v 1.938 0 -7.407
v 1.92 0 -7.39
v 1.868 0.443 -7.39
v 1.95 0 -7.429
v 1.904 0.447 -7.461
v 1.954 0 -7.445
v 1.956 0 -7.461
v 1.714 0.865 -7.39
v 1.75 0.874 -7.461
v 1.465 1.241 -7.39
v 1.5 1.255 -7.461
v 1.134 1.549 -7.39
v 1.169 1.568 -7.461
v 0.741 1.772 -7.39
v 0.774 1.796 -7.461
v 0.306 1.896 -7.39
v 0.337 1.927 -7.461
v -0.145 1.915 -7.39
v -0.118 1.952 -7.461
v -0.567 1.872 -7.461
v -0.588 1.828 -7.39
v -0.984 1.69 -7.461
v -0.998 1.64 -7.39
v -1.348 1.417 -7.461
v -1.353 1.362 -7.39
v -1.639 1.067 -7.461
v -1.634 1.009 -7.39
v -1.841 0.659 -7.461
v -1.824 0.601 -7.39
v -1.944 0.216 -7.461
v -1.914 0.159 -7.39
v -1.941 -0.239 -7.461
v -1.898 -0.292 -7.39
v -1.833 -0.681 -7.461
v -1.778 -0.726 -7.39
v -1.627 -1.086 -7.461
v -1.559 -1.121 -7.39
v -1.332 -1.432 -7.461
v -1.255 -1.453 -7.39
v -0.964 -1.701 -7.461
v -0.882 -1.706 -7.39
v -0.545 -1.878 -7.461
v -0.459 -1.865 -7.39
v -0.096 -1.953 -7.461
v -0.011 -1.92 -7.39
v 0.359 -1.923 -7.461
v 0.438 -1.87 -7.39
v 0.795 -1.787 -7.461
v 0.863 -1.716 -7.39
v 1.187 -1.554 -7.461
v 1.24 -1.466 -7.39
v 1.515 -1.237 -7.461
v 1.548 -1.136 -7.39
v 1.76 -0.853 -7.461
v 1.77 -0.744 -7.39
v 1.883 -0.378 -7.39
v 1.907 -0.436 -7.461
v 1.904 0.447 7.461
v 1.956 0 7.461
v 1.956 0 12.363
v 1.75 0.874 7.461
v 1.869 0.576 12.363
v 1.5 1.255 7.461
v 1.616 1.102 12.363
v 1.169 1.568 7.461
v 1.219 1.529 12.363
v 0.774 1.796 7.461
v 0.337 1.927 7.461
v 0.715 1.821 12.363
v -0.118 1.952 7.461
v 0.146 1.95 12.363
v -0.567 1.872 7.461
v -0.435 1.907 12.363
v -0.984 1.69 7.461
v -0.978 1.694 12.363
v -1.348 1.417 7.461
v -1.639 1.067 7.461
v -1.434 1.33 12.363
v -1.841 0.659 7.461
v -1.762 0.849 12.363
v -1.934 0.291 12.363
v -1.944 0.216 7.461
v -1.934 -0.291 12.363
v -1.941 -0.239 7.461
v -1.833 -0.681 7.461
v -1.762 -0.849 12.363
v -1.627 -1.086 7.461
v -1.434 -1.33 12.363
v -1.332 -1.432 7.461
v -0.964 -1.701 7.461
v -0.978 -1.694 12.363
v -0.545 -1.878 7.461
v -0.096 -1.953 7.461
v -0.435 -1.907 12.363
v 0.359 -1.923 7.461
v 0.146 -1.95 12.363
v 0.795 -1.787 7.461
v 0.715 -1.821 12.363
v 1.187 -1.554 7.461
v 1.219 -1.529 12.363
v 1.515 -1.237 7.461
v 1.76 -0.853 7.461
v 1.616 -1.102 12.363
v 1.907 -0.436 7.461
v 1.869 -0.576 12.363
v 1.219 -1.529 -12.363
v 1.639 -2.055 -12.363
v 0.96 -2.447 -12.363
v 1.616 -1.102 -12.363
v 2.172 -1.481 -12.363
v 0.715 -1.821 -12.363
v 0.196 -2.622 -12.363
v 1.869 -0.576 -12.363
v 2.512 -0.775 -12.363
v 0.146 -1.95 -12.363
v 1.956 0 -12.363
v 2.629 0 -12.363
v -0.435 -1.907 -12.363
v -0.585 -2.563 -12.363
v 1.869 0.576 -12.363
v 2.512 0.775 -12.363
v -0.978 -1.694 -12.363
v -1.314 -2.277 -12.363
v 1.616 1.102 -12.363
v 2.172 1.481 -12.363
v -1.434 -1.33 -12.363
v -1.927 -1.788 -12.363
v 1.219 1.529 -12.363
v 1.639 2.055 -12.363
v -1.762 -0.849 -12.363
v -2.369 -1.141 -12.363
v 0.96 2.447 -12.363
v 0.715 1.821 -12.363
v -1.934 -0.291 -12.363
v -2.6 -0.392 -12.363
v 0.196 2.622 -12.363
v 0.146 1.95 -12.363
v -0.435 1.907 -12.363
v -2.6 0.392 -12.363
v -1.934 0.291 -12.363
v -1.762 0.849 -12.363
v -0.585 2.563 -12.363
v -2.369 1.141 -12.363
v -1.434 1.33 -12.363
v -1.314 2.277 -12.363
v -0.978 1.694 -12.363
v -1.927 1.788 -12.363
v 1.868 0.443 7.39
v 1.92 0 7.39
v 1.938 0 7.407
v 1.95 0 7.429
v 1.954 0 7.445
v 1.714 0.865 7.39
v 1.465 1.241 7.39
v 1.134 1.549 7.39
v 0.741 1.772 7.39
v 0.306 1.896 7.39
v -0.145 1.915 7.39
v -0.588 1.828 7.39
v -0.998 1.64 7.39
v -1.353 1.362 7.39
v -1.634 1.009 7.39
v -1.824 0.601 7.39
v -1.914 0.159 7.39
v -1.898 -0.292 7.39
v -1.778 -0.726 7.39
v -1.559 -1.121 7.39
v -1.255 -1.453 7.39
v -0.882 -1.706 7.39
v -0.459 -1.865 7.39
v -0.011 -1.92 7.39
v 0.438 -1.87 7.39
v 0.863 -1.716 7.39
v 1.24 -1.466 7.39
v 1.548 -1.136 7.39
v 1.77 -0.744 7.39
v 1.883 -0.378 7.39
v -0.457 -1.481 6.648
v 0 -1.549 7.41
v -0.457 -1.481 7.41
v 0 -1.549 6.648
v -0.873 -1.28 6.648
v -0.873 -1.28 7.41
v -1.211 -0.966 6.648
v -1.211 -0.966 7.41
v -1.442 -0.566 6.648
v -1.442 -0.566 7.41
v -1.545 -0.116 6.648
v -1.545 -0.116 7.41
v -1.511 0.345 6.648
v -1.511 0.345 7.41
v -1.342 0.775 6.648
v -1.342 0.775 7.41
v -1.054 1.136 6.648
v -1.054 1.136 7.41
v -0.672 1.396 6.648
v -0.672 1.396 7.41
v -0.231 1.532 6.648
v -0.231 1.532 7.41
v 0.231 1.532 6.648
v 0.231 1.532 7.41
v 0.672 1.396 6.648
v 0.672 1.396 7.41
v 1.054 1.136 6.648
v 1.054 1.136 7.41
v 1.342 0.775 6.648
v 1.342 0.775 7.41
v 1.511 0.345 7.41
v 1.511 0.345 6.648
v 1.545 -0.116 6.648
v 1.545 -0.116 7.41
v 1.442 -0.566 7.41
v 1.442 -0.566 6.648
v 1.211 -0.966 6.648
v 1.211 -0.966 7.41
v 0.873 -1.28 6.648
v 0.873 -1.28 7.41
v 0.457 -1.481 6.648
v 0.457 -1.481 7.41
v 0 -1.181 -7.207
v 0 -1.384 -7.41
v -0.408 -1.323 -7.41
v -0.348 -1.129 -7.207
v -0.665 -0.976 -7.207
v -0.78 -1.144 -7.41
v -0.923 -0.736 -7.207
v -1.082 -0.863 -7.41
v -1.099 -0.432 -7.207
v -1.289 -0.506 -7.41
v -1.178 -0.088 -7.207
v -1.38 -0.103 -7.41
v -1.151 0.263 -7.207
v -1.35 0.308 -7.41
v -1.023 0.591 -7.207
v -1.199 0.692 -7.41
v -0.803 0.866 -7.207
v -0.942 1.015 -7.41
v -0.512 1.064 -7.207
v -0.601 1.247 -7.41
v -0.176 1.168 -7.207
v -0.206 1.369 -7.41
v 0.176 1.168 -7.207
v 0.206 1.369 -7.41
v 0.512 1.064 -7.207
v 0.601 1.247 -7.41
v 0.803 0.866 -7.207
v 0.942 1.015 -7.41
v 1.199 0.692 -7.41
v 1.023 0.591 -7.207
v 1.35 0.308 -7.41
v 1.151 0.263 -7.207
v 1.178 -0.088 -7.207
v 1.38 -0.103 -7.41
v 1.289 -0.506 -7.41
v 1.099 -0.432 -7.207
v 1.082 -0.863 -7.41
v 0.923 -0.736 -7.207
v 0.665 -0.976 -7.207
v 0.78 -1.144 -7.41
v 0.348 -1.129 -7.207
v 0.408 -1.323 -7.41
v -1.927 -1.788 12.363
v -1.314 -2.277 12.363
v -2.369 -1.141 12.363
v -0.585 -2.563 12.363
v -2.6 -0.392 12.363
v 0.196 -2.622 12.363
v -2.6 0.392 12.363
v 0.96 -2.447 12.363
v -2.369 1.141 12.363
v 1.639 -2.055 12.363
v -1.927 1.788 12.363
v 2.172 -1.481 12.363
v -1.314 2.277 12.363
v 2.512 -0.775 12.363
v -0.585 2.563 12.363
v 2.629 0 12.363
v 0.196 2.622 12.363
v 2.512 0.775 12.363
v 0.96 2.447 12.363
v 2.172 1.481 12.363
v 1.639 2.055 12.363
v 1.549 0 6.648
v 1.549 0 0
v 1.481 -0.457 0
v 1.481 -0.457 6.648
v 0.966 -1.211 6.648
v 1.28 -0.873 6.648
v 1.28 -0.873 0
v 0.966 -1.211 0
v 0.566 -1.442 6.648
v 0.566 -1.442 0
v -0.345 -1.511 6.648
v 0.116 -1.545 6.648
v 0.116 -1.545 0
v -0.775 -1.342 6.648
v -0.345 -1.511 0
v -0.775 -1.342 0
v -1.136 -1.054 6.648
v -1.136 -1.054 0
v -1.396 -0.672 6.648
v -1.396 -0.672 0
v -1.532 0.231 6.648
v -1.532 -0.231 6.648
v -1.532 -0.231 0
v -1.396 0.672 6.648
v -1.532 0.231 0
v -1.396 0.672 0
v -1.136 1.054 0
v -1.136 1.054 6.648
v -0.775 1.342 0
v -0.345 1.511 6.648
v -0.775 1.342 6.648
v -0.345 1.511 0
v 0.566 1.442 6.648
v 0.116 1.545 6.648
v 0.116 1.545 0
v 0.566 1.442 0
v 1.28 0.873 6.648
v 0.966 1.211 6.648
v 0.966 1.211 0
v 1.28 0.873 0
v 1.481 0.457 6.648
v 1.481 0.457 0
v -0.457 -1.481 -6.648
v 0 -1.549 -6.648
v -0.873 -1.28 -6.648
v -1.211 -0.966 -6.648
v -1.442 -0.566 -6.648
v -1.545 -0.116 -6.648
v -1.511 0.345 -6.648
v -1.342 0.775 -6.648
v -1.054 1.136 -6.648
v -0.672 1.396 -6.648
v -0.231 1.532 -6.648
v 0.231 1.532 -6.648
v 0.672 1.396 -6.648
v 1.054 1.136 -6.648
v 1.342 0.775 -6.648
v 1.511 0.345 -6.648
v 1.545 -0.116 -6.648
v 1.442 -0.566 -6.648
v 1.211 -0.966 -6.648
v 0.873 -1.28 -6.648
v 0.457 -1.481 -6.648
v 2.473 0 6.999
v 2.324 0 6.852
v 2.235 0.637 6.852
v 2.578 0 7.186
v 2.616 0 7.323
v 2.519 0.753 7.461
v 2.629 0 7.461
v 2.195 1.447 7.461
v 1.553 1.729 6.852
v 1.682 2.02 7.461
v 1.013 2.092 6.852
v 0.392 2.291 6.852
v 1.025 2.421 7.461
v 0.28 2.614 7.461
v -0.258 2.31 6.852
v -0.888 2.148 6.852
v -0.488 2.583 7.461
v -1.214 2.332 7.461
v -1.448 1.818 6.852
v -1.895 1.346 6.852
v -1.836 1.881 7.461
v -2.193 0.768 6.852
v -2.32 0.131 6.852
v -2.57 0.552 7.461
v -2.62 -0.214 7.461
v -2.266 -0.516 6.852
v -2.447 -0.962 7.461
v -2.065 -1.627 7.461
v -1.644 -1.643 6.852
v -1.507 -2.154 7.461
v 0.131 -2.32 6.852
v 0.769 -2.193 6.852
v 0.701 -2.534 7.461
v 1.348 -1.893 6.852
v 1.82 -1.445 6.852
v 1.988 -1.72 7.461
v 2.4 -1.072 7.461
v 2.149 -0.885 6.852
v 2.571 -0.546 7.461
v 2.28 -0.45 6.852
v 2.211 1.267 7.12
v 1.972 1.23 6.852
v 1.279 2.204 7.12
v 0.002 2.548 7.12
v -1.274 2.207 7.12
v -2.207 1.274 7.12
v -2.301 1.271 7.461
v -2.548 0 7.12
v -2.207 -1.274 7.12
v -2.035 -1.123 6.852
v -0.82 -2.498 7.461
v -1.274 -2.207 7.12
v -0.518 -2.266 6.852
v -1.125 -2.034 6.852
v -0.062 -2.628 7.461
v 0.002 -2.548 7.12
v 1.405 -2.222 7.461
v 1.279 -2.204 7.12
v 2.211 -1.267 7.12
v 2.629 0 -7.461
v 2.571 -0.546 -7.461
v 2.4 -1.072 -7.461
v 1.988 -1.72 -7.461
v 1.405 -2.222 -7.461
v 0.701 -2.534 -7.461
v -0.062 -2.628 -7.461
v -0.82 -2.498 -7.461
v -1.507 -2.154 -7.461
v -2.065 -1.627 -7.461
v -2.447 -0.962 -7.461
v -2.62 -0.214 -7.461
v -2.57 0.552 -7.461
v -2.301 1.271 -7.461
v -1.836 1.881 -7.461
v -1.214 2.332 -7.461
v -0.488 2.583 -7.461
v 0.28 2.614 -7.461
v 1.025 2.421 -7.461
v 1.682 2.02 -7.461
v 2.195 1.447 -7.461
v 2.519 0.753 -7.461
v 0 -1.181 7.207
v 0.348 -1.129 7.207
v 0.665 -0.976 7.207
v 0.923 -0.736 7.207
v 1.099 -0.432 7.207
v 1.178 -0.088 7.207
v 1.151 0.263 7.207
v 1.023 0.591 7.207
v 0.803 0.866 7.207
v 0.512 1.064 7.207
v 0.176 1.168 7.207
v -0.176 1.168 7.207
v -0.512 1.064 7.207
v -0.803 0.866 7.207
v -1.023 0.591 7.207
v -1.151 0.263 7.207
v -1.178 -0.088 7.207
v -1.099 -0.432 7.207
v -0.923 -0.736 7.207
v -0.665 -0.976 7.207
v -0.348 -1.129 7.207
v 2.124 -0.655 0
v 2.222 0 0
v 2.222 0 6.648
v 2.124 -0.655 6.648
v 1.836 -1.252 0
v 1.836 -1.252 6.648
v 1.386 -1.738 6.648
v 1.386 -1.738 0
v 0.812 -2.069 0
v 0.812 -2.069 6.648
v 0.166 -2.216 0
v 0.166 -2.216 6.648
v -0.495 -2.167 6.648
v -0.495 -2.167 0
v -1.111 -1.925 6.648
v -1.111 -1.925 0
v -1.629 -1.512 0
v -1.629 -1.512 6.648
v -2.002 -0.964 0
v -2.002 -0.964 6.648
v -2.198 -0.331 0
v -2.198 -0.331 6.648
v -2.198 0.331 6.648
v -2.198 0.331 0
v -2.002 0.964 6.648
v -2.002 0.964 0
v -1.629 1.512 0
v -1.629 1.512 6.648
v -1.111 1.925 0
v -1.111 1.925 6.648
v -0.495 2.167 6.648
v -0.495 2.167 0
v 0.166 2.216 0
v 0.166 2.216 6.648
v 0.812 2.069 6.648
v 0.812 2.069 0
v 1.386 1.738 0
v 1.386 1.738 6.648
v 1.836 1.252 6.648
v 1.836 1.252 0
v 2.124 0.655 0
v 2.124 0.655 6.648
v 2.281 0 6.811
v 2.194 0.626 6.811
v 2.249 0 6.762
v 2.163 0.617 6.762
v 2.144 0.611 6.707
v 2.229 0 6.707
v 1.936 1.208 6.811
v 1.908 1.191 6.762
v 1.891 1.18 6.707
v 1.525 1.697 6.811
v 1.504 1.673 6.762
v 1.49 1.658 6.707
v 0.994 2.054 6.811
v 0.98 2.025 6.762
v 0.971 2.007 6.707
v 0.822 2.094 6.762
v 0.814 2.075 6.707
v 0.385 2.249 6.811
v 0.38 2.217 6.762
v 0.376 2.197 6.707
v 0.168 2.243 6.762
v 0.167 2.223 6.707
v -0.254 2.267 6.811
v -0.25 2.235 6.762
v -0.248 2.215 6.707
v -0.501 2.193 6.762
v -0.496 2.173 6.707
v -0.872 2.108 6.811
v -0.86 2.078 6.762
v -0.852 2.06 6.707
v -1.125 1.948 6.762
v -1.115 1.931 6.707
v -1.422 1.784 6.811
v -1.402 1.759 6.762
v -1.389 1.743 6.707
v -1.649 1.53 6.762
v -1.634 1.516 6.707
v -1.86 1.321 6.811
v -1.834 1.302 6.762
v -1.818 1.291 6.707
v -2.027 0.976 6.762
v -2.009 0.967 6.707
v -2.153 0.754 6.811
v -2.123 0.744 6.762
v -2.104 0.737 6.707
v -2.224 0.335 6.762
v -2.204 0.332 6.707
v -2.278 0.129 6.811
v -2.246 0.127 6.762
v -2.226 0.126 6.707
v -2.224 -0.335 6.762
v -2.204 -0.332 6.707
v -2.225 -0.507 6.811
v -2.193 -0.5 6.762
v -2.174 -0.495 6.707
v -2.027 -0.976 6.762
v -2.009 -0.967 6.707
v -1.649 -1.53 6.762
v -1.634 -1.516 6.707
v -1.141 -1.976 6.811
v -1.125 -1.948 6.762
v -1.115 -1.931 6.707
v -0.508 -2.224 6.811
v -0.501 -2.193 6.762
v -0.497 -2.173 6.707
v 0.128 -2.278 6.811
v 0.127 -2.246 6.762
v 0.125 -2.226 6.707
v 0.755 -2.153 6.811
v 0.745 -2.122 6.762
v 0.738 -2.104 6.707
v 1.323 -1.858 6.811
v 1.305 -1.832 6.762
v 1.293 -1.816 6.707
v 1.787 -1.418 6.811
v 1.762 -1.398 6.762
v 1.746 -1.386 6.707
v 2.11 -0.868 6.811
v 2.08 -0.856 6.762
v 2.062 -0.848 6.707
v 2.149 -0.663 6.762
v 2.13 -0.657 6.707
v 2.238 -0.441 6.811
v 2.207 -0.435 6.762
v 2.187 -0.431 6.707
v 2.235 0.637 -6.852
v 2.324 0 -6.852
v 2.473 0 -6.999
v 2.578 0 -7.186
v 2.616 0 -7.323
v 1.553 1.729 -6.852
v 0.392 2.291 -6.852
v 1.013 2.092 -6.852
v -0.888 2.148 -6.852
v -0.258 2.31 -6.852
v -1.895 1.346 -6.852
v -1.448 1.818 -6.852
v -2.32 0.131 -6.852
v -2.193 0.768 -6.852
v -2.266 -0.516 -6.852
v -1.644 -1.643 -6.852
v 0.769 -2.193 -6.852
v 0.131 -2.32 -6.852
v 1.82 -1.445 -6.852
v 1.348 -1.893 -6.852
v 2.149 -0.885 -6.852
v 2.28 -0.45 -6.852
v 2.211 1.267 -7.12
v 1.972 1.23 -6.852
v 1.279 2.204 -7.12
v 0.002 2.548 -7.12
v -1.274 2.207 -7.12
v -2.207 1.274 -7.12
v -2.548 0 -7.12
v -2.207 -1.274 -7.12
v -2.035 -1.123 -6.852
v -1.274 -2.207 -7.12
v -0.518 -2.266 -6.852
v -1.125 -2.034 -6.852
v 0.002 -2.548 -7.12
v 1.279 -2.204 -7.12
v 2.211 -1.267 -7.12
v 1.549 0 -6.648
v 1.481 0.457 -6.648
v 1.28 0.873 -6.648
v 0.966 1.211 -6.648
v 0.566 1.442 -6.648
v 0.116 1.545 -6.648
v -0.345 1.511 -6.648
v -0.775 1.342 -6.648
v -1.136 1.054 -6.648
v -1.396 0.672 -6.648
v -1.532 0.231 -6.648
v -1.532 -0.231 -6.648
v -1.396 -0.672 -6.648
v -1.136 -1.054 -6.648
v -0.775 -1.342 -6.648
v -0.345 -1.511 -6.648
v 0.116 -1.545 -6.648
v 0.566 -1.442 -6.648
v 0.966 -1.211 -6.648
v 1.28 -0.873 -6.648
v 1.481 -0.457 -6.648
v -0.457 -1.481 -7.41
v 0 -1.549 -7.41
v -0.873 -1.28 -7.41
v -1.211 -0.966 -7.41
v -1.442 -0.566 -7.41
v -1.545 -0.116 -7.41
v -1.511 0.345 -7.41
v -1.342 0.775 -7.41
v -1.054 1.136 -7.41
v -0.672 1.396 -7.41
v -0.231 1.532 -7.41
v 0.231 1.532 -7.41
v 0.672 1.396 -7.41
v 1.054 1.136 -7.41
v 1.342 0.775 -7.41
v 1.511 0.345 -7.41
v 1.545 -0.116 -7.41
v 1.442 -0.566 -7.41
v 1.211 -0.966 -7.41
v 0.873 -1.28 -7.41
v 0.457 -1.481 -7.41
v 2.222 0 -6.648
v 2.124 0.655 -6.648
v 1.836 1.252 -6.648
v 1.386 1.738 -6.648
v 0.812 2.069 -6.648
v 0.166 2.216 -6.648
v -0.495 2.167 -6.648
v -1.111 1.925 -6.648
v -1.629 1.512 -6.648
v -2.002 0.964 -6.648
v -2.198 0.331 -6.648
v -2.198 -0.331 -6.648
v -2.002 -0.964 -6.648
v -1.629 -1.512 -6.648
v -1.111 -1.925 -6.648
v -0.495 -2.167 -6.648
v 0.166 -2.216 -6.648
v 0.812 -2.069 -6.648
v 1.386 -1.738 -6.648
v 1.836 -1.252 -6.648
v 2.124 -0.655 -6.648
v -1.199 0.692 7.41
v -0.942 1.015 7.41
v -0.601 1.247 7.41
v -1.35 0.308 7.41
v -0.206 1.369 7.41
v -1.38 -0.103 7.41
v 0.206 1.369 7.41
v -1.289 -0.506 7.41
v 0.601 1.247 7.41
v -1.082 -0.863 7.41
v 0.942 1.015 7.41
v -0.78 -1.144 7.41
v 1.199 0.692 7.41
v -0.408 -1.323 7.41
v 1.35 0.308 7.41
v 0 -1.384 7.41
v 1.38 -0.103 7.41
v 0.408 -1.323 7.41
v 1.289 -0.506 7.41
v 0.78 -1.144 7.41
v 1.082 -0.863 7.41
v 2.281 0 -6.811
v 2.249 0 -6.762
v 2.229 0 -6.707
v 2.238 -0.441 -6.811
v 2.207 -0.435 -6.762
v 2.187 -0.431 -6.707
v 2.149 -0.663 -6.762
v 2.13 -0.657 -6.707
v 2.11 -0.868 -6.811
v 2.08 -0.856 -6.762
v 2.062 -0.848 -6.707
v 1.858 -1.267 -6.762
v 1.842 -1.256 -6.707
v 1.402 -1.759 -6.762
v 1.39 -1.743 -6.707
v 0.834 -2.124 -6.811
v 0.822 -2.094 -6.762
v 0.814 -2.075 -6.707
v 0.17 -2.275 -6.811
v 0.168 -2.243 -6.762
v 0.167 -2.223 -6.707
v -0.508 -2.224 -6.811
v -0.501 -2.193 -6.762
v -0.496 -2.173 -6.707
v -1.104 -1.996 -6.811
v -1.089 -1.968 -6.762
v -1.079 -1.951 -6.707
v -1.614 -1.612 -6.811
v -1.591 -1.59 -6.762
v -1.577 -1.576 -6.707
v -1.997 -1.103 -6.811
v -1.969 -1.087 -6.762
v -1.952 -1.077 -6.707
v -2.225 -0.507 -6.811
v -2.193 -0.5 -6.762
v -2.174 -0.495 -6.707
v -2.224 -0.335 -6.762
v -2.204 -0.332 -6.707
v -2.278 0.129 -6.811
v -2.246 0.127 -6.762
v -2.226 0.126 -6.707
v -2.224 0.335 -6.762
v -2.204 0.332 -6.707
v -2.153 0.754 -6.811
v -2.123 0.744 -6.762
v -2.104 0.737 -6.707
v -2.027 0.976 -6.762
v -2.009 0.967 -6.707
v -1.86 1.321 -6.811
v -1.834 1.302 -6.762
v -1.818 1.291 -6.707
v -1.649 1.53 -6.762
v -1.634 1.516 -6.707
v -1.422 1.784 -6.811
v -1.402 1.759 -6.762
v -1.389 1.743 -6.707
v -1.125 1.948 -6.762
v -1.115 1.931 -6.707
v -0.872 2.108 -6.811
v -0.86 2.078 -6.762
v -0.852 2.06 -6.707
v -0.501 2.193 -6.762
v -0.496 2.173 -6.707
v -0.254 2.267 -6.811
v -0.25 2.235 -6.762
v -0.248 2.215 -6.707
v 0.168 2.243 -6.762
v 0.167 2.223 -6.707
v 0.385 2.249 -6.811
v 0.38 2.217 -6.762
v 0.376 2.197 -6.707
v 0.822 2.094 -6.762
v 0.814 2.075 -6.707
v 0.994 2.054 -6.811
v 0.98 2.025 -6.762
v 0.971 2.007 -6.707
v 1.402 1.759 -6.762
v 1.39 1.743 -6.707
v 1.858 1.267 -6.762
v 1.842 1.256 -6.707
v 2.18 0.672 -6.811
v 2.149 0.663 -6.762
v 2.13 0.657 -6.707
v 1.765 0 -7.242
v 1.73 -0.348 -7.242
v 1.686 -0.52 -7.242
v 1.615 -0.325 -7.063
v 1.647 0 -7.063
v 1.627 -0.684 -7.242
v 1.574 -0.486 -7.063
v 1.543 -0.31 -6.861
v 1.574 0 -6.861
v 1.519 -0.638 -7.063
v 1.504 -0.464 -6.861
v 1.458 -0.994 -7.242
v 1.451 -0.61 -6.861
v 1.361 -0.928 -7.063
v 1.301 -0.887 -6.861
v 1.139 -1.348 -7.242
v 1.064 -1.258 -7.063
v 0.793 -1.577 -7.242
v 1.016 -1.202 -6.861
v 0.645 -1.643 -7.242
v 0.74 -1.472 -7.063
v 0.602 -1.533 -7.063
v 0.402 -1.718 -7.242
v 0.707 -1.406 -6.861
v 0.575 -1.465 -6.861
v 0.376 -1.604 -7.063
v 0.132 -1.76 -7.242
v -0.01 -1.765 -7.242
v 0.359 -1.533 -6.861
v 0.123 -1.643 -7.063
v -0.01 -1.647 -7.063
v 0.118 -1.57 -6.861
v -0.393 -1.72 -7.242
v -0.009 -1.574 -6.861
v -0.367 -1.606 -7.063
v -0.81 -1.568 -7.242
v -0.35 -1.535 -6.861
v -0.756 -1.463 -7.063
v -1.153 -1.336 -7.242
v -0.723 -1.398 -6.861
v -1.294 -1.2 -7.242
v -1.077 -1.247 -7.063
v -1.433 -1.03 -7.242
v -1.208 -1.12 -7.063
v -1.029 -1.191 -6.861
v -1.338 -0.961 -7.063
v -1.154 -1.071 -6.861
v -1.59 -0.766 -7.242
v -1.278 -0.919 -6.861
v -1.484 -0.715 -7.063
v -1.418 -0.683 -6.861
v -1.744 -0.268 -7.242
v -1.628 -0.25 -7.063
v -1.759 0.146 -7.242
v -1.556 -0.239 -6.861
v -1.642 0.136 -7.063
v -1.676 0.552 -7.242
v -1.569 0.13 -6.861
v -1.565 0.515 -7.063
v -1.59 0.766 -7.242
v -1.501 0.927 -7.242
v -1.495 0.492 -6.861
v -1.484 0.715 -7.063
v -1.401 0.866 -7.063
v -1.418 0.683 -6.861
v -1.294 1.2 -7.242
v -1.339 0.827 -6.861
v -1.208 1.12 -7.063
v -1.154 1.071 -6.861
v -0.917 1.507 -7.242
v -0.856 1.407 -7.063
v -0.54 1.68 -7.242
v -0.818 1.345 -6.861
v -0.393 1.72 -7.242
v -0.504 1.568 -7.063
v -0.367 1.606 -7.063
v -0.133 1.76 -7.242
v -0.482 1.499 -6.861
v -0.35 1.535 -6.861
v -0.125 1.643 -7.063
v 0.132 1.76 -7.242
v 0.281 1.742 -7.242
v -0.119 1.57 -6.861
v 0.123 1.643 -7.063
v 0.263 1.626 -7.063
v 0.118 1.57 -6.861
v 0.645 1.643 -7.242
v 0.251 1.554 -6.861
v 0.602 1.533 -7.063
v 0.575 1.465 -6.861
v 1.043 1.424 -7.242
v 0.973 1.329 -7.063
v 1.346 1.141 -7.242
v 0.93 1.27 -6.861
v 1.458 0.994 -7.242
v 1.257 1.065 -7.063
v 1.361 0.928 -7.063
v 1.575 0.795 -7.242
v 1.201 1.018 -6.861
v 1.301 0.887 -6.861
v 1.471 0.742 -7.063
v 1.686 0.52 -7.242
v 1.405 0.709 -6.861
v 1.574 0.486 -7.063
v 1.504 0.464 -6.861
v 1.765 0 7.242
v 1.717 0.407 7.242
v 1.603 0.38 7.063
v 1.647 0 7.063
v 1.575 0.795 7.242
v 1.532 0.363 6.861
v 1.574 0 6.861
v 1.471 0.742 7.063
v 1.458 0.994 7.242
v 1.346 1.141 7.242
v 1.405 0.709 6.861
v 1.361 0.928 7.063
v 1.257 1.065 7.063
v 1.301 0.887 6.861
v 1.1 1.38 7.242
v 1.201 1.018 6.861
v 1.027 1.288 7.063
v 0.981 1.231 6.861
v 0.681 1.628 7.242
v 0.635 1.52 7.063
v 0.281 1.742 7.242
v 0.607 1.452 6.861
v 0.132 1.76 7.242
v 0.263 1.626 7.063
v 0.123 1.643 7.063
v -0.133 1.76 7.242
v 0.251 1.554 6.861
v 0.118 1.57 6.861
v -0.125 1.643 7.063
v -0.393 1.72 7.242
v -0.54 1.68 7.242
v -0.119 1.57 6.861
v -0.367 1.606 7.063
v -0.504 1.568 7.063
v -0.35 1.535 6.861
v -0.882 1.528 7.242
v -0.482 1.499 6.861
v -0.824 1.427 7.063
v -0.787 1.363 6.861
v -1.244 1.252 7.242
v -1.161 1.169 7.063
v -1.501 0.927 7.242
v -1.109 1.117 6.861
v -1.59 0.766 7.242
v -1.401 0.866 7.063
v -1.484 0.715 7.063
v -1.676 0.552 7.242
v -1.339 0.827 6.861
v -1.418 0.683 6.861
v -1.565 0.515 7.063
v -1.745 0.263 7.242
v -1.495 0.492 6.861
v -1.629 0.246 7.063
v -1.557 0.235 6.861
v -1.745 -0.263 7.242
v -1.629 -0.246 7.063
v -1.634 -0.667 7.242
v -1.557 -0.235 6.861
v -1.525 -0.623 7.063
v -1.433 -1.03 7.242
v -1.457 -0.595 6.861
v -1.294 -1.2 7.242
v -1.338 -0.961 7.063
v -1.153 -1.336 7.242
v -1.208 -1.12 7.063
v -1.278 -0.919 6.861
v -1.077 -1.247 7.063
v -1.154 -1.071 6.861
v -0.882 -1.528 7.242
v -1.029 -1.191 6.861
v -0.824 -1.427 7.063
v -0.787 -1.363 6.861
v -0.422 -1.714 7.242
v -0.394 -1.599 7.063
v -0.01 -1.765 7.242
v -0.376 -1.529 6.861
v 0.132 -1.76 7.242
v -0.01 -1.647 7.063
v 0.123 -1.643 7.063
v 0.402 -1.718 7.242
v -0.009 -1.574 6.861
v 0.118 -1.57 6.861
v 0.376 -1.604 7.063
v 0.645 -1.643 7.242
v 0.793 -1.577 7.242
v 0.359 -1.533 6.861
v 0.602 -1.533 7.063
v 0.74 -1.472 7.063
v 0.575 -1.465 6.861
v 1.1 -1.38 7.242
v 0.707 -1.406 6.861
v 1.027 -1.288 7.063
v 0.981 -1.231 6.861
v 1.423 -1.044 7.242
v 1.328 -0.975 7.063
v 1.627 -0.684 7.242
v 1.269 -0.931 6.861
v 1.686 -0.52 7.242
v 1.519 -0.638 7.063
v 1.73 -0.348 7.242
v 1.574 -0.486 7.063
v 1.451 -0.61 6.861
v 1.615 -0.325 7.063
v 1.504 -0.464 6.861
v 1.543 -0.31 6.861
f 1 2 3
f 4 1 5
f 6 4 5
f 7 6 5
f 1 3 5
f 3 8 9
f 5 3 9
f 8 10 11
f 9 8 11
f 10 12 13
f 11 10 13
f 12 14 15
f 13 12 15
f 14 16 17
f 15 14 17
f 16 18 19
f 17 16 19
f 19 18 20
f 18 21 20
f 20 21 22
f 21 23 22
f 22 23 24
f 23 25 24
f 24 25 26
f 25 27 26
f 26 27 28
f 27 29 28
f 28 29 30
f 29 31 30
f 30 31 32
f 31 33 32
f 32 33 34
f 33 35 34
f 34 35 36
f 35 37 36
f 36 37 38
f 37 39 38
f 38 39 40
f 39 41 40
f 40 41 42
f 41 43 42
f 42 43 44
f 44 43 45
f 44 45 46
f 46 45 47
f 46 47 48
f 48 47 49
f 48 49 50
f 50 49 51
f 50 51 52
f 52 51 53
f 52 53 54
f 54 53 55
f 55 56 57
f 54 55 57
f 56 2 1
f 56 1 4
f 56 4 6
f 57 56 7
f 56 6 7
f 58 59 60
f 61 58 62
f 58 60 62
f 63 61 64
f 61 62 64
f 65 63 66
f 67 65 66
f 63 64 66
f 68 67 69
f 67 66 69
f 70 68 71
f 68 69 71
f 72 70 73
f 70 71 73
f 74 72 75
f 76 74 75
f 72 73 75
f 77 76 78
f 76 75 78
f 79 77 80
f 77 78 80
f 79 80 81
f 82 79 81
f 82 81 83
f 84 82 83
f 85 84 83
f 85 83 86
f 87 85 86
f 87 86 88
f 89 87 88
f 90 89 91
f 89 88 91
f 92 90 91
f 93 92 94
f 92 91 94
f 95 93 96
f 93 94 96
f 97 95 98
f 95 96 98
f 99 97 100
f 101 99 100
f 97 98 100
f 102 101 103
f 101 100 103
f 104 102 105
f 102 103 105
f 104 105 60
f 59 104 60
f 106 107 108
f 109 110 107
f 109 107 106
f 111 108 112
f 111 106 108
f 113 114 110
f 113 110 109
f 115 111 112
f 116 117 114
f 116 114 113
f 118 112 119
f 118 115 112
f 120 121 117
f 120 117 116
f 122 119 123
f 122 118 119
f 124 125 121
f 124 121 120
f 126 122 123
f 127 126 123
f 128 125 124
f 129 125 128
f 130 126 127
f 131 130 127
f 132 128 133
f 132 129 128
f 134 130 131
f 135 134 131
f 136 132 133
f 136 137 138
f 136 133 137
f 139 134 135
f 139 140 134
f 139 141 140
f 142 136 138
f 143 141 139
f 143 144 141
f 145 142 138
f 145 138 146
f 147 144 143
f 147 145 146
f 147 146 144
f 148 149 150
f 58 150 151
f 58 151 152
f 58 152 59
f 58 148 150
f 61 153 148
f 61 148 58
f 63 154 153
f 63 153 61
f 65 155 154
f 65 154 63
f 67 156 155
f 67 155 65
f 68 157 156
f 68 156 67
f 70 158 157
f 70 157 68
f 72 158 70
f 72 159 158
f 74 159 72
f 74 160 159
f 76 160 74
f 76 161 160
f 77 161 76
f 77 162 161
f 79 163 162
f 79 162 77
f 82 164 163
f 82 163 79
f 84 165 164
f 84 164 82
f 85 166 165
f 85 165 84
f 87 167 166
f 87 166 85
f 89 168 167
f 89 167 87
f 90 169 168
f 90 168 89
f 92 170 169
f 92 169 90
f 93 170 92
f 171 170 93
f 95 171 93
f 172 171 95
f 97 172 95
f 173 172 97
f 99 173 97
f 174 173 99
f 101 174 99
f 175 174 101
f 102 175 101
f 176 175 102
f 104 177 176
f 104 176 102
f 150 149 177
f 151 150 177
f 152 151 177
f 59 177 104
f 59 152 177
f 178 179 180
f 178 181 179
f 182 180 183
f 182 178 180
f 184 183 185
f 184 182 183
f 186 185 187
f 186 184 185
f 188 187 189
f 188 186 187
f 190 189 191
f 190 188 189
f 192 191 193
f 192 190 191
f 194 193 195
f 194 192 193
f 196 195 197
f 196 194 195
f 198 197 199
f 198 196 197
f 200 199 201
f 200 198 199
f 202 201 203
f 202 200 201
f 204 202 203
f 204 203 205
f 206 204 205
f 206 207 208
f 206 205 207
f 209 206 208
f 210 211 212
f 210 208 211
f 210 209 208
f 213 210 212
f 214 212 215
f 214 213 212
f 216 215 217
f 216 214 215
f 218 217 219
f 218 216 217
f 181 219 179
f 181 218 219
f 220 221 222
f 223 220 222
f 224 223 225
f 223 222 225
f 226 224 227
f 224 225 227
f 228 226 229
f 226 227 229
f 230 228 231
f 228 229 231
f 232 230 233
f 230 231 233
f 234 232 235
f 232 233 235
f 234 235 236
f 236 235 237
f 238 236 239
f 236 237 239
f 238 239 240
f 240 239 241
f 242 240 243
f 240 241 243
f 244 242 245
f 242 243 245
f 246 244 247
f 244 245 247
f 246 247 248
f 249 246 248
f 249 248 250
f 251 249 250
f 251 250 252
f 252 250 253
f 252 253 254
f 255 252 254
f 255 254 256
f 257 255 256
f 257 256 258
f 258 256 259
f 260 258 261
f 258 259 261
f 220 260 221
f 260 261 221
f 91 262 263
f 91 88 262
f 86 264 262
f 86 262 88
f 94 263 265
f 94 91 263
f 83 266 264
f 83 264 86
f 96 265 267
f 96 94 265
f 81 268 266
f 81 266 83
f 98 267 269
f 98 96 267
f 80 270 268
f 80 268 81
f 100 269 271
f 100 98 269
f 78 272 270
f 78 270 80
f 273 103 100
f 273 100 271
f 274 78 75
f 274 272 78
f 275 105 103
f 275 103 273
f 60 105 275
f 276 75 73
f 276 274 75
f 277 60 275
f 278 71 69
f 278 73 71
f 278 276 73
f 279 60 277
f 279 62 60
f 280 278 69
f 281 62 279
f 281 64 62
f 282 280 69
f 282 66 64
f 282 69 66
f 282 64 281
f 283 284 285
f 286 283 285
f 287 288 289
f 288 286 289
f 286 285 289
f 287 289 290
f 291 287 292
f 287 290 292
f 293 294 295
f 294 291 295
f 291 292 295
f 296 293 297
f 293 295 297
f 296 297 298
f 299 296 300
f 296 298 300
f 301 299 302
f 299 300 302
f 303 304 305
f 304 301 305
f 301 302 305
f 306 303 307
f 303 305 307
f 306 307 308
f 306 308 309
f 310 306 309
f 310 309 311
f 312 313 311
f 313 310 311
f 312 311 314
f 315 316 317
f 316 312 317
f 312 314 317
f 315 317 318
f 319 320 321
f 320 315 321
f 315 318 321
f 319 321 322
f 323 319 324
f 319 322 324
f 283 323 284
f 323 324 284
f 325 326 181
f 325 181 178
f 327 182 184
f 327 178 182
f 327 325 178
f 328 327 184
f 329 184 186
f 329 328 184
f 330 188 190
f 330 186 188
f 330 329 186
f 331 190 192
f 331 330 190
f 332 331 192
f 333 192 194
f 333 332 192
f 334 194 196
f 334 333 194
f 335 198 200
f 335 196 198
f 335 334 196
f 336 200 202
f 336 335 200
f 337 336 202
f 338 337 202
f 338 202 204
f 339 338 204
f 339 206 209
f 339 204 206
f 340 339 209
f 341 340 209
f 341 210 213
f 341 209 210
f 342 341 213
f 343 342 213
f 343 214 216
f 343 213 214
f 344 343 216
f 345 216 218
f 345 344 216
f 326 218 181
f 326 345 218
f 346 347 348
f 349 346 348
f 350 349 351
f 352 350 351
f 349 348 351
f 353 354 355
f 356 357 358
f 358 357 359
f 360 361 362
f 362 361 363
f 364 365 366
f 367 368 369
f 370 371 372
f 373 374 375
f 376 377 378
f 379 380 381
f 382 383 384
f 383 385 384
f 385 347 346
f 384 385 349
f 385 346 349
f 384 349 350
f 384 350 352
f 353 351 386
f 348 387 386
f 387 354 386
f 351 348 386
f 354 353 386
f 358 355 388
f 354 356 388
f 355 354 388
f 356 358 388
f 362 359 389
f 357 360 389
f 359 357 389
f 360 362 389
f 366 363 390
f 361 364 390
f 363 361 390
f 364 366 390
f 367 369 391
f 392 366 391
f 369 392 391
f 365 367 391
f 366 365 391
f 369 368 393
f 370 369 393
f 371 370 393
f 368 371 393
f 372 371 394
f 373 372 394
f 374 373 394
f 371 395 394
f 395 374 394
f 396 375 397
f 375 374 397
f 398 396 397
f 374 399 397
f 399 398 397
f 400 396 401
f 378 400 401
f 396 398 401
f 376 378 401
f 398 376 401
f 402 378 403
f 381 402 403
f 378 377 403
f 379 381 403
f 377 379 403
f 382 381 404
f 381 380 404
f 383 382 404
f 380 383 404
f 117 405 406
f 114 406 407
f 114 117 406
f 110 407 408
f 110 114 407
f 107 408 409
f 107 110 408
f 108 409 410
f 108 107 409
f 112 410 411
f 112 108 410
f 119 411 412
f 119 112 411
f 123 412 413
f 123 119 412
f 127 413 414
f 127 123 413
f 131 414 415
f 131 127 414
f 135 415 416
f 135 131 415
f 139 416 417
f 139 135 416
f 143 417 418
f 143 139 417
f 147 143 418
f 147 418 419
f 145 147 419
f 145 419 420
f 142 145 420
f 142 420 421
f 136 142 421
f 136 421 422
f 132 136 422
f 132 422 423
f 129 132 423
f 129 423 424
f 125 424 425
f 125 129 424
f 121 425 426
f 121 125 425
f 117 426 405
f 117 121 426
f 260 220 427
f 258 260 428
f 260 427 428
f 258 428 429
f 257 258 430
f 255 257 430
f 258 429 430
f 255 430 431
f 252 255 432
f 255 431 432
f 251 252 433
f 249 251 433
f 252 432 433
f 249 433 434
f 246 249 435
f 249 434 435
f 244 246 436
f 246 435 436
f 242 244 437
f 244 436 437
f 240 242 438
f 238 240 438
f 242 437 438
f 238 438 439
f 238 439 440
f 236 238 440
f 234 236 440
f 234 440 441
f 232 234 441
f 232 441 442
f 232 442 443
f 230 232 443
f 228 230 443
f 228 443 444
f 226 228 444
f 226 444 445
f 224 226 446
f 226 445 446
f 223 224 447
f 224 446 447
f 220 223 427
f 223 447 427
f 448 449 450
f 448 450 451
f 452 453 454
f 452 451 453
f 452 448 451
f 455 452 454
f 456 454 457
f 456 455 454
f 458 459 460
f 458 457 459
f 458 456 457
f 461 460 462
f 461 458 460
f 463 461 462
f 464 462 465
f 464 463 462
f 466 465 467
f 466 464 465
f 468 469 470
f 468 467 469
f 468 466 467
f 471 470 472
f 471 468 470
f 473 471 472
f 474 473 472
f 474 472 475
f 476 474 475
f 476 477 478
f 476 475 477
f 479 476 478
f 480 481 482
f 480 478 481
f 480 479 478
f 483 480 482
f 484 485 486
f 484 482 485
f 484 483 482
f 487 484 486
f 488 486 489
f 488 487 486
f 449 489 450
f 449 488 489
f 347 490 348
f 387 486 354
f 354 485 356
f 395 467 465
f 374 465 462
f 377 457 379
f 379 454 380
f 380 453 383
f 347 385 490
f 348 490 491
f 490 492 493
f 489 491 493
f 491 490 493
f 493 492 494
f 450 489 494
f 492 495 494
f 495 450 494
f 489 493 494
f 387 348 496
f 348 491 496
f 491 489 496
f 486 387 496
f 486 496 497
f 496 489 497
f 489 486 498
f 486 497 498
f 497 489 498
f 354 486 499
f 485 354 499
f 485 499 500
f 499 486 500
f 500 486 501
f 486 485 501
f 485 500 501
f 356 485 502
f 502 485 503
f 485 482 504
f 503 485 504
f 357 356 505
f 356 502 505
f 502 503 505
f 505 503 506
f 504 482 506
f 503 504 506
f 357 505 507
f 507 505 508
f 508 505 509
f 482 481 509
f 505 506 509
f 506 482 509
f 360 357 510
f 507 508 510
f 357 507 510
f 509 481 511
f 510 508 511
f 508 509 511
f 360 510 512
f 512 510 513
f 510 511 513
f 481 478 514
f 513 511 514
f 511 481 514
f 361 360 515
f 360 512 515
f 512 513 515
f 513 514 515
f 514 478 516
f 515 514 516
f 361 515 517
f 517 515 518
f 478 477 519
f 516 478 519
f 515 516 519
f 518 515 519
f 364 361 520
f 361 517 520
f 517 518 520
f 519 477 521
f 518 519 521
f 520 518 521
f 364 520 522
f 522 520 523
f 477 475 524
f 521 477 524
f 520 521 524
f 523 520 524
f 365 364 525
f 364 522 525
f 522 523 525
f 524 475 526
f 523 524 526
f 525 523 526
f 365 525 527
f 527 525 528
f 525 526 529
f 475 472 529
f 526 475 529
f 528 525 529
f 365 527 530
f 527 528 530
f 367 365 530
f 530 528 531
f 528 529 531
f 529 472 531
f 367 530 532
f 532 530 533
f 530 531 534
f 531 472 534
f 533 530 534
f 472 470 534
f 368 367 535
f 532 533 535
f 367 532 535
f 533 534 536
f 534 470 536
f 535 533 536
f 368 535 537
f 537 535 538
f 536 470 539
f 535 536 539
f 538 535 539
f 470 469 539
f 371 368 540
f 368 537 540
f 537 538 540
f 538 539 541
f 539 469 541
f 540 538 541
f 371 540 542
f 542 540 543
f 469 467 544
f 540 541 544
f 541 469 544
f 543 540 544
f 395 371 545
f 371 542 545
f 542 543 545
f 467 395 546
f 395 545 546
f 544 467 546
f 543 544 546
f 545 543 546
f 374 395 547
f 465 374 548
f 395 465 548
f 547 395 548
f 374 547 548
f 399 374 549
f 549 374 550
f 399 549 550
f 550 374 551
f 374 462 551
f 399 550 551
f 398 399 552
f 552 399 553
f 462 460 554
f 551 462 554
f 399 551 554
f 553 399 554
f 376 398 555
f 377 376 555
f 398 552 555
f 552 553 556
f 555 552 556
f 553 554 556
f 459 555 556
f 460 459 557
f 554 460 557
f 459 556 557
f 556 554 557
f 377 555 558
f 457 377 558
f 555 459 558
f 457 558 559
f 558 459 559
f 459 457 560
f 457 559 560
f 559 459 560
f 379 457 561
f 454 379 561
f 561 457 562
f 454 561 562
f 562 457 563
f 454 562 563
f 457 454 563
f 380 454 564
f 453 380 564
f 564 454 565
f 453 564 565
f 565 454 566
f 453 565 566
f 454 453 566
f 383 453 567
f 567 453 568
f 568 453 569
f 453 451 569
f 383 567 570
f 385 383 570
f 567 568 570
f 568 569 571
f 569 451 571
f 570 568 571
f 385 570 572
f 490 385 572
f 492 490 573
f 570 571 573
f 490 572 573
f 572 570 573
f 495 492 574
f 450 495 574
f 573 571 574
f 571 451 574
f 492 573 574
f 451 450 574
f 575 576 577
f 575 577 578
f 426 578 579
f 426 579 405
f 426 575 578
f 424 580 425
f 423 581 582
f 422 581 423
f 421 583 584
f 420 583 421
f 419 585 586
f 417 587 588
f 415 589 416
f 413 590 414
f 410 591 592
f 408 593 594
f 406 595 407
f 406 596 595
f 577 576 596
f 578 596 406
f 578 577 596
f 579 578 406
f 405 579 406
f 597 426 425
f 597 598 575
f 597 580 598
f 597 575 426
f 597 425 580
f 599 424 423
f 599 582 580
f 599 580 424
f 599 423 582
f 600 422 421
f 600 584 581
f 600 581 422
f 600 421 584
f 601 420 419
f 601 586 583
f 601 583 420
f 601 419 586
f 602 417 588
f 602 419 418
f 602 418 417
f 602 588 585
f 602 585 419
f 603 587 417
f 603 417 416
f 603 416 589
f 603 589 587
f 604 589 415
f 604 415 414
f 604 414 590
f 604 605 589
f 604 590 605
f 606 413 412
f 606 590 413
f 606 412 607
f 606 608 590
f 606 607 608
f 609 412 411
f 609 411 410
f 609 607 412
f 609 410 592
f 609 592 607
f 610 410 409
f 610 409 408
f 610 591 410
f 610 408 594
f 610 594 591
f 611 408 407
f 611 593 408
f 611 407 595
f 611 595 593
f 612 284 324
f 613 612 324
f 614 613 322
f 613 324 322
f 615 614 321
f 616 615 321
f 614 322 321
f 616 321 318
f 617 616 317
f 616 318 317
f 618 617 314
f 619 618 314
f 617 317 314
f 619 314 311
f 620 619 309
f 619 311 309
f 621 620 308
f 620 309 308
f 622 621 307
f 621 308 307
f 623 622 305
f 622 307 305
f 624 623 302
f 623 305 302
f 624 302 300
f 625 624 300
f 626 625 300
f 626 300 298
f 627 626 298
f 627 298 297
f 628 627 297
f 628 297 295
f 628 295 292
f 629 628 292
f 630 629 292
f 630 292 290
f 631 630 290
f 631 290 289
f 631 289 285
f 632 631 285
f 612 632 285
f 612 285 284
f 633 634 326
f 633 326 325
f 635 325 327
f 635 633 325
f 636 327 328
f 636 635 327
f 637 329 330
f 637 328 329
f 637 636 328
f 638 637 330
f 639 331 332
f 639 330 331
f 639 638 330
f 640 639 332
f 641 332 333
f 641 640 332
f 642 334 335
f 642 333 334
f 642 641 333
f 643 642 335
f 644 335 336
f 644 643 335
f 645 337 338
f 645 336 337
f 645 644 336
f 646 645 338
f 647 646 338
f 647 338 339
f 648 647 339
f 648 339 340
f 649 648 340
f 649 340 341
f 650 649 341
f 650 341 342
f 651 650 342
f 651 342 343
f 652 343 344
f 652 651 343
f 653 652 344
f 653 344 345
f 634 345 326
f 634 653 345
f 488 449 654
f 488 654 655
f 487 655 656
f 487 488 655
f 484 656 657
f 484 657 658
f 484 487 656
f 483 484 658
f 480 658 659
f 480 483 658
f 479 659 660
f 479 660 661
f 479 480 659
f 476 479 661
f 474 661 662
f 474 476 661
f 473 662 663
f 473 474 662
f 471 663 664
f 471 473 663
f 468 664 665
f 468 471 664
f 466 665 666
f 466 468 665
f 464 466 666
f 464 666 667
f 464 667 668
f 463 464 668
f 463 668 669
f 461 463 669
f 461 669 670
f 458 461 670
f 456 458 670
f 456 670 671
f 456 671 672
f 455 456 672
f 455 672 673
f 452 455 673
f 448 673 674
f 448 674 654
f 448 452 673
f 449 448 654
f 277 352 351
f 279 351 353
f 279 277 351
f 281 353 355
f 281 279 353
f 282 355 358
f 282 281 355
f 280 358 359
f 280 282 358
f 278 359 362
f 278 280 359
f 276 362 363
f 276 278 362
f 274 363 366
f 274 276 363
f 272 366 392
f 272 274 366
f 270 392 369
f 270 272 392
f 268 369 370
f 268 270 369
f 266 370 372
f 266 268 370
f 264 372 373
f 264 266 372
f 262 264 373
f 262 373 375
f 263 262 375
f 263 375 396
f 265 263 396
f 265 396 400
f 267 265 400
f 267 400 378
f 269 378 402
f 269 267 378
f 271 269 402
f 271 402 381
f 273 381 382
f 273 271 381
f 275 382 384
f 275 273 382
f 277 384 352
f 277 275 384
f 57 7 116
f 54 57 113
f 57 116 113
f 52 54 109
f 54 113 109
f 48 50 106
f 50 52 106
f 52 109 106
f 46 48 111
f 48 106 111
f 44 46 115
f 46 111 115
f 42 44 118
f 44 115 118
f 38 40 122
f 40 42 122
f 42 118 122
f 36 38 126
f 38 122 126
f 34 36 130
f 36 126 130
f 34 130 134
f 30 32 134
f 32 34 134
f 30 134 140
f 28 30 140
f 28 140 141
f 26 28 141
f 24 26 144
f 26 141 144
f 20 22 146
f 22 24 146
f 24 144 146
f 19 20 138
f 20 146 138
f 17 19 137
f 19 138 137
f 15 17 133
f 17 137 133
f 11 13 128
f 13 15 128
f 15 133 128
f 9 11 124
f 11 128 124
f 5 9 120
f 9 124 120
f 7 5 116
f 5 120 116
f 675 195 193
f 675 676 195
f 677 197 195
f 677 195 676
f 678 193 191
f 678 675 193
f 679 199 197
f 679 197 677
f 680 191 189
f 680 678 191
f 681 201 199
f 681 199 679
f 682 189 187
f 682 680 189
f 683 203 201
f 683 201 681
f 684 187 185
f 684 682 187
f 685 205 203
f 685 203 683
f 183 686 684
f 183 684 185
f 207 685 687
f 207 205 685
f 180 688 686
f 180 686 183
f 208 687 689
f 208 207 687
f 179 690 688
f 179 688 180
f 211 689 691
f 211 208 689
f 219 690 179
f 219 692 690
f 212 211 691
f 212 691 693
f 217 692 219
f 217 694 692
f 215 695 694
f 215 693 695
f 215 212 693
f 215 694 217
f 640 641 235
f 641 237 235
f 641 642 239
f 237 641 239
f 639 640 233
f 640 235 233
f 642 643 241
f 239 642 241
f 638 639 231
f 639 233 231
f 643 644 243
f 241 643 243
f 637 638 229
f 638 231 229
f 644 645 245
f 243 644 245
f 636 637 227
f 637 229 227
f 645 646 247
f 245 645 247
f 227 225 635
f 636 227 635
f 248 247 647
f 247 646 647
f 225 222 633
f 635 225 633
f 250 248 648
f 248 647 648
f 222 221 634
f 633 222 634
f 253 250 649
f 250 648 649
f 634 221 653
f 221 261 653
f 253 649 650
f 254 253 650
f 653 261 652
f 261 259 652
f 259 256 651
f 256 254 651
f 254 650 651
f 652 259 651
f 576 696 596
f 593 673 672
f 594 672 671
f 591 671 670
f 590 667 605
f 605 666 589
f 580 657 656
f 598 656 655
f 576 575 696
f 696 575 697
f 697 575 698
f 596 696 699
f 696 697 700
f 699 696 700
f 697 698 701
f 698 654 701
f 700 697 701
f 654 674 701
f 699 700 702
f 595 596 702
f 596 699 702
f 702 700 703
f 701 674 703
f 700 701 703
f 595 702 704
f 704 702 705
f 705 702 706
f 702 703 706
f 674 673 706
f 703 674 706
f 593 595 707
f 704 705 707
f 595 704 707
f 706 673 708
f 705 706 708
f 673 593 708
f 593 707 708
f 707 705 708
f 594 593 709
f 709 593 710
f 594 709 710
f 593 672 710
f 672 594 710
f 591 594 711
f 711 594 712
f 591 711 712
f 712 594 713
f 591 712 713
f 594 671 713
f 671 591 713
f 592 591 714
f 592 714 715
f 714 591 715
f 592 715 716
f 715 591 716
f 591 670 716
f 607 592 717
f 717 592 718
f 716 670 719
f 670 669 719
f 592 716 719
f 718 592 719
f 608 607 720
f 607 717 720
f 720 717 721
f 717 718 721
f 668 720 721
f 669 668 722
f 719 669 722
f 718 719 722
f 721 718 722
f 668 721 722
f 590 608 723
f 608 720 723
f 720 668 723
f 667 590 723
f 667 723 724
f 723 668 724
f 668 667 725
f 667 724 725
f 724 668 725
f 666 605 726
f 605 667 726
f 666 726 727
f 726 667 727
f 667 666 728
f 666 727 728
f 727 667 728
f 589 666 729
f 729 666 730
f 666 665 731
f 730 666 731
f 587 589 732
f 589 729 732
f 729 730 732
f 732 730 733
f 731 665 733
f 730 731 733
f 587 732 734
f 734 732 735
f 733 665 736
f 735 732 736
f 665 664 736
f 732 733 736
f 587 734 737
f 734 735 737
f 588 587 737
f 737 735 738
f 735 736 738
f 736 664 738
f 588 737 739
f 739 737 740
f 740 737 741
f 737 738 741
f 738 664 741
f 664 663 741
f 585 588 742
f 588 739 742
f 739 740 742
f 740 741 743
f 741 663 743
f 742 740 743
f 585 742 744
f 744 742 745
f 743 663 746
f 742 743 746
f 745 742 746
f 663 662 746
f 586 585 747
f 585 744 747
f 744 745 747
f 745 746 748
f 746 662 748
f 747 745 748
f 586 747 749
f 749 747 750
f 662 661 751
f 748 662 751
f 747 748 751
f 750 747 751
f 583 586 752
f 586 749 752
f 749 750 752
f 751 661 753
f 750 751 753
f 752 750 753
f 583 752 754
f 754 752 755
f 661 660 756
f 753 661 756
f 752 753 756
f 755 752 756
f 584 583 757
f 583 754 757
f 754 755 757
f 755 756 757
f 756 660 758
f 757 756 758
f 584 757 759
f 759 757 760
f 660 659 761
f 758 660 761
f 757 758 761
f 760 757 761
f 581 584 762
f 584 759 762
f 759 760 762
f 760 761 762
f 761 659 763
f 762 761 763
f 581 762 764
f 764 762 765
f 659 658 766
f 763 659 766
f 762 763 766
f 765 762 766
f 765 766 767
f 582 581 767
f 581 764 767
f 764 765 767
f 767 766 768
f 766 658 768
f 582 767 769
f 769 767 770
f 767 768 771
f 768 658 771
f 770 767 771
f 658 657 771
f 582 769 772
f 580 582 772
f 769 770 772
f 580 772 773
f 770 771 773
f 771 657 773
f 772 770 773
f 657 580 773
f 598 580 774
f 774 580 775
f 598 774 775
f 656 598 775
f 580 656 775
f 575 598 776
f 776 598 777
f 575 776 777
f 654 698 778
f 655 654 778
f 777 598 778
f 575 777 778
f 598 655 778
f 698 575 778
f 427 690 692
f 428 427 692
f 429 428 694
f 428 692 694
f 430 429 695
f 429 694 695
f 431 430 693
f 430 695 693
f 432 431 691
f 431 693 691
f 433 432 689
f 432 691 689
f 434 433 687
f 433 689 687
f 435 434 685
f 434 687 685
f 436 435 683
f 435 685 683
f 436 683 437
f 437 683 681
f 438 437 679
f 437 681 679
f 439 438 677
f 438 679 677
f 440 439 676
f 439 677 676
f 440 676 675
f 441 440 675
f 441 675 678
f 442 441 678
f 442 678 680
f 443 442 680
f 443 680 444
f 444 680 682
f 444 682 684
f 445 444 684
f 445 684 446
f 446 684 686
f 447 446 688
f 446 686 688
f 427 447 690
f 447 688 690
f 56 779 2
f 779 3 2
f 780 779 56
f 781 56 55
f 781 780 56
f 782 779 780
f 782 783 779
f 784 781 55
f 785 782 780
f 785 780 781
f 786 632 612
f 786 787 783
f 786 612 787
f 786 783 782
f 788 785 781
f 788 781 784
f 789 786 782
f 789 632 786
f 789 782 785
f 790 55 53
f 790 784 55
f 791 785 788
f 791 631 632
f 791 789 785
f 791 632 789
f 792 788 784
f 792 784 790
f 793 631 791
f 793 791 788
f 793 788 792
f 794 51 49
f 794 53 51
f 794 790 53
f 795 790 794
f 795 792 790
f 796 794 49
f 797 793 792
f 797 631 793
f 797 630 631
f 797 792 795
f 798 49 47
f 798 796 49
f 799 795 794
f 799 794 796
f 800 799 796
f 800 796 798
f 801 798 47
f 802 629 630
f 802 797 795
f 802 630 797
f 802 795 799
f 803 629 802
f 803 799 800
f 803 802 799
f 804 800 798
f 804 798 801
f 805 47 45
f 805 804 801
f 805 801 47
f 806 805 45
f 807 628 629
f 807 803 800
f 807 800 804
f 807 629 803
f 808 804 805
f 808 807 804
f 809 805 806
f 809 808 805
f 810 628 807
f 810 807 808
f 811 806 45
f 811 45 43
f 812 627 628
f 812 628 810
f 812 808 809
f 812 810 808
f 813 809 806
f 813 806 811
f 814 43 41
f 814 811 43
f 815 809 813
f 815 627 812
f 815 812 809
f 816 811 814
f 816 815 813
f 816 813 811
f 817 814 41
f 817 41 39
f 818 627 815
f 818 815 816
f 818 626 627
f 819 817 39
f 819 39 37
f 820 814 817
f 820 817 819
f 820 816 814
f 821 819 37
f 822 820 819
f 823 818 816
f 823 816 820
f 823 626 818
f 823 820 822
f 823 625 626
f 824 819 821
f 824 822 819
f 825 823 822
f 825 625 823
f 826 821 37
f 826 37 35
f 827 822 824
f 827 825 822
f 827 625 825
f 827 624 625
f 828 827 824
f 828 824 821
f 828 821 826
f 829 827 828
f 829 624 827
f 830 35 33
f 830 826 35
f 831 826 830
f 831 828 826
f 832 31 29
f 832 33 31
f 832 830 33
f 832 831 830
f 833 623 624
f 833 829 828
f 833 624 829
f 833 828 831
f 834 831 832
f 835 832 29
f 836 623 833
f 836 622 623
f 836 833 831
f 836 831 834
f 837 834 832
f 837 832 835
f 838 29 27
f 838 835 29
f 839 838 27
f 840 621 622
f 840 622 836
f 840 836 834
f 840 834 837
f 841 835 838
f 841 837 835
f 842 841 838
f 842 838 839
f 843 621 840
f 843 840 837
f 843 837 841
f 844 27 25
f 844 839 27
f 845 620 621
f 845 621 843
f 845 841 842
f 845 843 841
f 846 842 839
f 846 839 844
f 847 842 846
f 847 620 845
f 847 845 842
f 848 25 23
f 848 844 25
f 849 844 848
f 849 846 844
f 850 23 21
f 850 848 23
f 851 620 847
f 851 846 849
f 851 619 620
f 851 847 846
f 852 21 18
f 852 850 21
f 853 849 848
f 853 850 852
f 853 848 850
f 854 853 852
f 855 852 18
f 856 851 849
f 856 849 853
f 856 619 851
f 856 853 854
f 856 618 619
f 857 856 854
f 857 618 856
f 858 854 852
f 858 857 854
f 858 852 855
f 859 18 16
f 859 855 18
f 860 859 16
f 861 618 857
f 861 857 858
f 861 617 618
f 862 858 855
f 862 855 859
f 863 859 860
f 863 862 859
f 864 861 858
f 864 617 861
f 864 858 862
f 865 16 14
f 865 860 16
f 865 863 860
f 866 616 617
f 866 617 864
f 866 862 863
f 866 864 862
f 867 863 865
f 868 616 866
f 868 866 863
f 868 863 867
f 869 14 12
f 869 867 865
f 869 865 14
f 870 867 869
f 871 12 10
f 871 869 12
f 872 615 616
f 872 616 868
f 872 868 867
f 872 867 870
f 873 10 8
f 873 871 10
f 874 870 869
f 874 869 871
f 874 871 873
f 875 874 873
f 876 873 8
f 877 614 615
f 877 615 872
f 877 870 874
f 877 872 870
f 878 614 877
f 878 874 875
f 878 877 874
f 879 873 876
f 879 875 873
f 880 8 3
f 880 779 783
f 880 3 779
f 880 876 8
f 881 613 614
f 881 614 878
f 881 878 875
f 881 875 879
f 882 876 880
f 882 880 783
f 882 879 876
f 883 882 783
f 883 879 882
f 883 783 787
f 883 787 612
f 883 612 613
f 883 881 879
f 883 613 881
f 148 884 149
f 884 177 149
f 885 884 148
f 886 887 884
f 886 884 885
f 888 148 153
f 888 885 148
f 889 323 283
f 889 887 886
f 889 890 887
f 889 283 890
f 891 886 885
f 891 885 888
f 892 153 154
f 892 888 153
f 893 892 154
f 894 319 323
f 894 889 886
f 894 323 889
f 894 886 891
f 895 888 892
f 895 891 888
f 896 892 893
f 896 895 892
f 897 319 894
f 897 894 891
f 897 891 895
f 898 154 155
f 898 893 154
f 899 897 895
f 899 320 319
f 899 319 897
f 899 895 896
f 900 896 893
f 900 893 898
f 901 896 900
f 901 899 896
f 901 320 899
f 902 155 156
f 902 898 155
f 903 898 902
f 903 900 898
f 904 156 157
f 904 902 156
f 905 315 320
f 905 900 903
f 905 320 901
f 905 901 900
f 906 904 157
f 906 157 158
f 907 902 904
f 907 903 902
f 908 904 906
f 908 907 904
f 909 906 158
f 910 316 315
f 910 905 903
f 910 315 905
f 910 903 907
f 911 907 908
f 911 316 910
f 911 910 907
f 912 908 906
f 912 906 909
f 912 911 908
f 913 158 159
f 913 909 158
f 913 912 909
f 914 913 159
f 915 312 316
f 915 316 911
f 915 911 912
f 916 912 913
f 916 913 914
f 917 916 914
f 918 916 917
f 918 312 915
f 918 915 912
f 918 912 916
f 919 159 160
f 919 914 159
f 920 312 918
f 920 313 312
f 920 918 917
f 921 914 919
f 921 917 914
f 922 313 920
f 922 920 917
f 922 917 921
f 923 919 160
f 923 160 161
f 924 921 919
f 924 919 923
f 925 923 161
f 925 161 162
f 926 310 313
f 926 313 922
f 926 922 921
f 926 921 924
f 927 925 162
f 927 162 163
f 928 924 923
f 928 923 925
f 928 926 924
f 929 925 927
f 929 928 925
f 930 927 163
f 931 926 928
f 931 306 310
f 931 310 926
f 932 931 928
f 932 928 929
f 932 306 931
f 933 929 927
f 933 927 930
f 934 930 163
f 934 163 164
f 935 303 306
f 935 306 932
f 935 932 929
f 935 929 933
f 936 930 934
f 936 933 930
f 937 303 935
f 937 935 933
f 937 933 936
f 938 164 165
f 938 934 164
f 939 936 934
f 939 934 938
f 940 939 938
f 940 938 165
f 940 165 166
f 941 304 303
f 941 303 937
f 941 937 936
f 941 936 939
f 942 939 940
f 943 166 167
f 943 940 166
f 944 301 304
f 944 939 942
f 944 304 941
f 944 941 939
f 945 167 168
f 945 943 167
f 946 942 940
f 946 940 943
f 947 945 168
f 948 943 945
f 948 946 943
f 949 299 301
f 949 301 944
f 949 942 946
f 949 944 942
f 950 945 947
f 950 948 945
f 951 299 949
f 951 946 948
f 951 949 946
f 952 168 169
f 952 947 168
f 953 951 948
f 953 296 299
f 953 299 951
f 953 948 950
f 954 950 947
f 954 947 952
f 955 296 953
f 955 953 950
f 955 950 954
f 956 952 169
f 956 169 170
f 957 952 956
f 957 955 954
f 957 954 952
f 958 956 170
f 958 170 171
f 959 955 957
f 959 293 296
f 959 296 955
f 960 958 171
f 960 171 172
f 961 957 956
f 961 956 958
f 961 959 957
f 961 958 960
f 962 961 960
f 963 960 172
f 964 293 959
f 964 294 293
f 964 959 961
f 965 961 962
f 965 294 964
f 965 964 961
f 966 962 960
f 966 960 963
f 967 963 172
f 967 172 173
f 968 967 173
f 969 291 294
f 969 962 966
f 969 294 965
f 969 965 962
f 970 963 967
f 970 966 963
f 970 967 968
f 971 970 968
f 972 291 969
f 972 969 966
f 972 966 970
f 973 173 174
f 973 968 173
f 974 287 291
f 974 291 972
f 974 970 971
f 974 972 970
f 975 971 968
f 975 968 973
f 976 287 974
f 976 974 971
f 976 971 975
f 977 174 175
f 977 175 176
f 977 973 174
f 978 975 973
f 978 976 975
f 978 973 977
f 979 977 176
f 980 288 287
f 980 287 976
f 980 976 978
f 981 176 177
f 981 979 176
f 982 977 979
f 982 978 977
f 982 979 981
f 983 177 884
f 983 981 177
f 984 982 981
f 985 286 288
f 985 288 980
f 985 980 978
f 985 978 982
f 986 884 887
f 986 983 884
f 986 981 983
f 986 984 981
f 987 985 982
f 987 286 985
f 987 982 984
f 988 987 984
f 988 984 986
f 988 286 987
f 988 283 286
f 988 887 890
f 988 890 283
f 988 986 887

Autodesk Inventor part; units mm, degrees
ref_plane "YZ Plane" through (0, 0, 0) normal (1, 0, 0) x (0, 1, 0)
ref_plane "XZ Plane" through (0, 0, 0) normal (0, 1, 0) x (-1, 0, 0)
ref_plane "XY Plane" through (0, 0, 0) normal (0, 0, 1) x (1, 0, 0)
sketch "Sketch1" plane through (0, 0, 0) normal (0, 0, 1) x (1, 0, 0)
  circle A0 centre (0, 0) radius 2.2225
  dimension "d0" = 4.445
extrude "Extrusion1" add sketch "Sketch1" along normal mid plane 24.7269
sketch "Sketch2" plane through (0, 0, 12.36345) normal (0, 0, 1) x (1, 0, 0)
  circle A0 centre (0, 0) radius 2.2225
  circle A1 centre (0, 0) radius 2.6289
  dimension "d3" = 5.2578
extrude "Extrusion2" add sketch "Sketch2" against normal blind 5.461
fillet "Fillet1" radius 0.254 1 edges at (-2.2225, 0, 6.9024)
fillet "Fillet2" radius 0.762 1 edges at (-2.6289, 0, 6.9024)
mirror "Mirror1" about plane through (0, 0, 0) normal (0, 0, 1) of "Extrusion2", "Fillet1", "Fillet2"
shell "Shell1" thickness 0.6731 removed faces 2 at (-0.850836, 0.209712, -12.36345) at (-0.850836, 0.209712, 12.36345)
sketch "Sketch3" plane through (0, 0, 0) normal (1, 0, 0) x (0, 1, 0)
  line L0 (-2.6289, 7.46125) -> (-2.6289, 12.36345)
  line L1 (-2.6289, 12.36345) -> (-1.9558, 12.36345)
  line L2 (-1.9558, 12.36345) -> (-1.9558, 7.46125)
  line L3 (-1.5494, 6.64845) -> (-1.5494, -6.64845)
  line L4 (-1.9558, -7.46125) -> (-1.9558, -12.36345)
  line L5 (-1.9558, -12.36345) -> (-2.6289, -12.36345)
  line L6 (-2.6289, -12.36345) -> (-2.6289, -7.46125)
  arc A0 (-2.3241, -6.85165) -> (-2.2225, -6.64845) centre (-2.4765, -6.64845) ccw
  line L7 (-2.2225, -6.64845) -> (-2.2225, 6.64845)
  arc A1 (-2.2225, 6.64845) -> (-2.3241, 6.85165) centre (-2.4765, 6.64845) ccw
  arc A2 (2.3241, 6.85165) -> (2.2225, 6.64845) centre (2.4765, 6.64845) ccw
  line L8 (2.2225, 6.64845) -> (2.2225, -6.64845)
  arc A3 (2.2225, -6.64845) -> (2.3241, -6.85165) centre (2.4765, -6.64845) ccw
  line L9 (2.6289, -7.46125) -> (2.6289, -12.36345)
  line L10 (2.6289, -12.36345) -> (1.9558, -12.36345)
  line L11 (1.9558, -12.36345) -> (1.9558, -7.46125)
  line L12 (1.5494, -6.64845) -> (1.5494, 6.64845)
  line L13 (1.9558, 7.46125) -> (1.9558, 12.36345)
  line L14 (1.9558, 12.36345) -> (2.6289, 12.36345)
  line L15 (2.6289, 12.36345) -> (2.6289, 7.46125)
  line L16 (-1.5494, -7.41045) -> (-1.1811, -7.41045)
  line L17 (-1.1811, -7.41045) -> (-1.1811, 7.41045)
  line L18 (-1.1811, 7.41045) -> (-1.5494, 7.41045)
  line L19 (-1.5494, 7.41045) -> (-1.5494, -7.41045)
  line L20 (0, -17.30883) -> (0, 17.30883)
  arc A4 (-2.6289, 7.46125) -> (-2.3241, 6.85165) centre (-1.8669, 7.46125) ccw
  arc A5 (-1.9558, 7.46125) -> (-1.92024, 7.39013) centre (-1.8669, 7.46125) ccw
  arc A6 (-1.5494, 6.64845) -> (-1.92024, 7.39013) centre (-2.4765, 6.64845) ccw
  arc A7 (-1.92024, -7.39013) -> (-1.5494, -6.64845) centre (-2.4765, -6.64845) ccw
  arc A8 (-1.92024, -7.39013) -> (-1.9558, -7.46125) centre (-1.8669, -7.46125) ccw
  arc A9 (-2.3241, -6.85165) -> (-2.6289, -7.46125) centre (-1.8669, -7.46125) ccw
  arc A10 (2.3241, 6.85165) -> (2.6289, 7.46125) centre (1.8669, 7.46125) ccw
  arc A11 (2.6289, -7.46125) -> (2.3241, -6.85165) centre (1.8669, -7.46125) ccw
  arc A12 (1.9558, -7.46125) -> (1.92024, -7.39013) centre (1.8669, -7.46125) ccw
  arc A13 (1.5494, -6.64845) -> (1.92024, -7.39013) centre (2.4765, -6.64845) ccw
  arc A14 (1.92024, 7.39013) -> (1.5494, 6.64845) centre (2.4765, 6.64845) ccw
  arc A15 (1.92024, 7.39013) -> (1.9558, 7.46125) centre (1.8669, 7.46125) ccw
  point P0 (0, 0)
  dimension "d9" = 0.3683
  dimension "d10" = 0.762
  dimension "d11" = 0.762
revolve "Revolution1" add sketch "Sketch3" angle 360 about axis through (0, 0, -10) along (0, 0, 1) separate body contours L19 L18 L17 L16 L3
chamfer "Chamfer1" distance 0.2032 angle 45 2 edges at (0, 1.1811, 7.4105) (0, 1.1811, -7.4105)
properties part number "22-18 double sided female tube red"
